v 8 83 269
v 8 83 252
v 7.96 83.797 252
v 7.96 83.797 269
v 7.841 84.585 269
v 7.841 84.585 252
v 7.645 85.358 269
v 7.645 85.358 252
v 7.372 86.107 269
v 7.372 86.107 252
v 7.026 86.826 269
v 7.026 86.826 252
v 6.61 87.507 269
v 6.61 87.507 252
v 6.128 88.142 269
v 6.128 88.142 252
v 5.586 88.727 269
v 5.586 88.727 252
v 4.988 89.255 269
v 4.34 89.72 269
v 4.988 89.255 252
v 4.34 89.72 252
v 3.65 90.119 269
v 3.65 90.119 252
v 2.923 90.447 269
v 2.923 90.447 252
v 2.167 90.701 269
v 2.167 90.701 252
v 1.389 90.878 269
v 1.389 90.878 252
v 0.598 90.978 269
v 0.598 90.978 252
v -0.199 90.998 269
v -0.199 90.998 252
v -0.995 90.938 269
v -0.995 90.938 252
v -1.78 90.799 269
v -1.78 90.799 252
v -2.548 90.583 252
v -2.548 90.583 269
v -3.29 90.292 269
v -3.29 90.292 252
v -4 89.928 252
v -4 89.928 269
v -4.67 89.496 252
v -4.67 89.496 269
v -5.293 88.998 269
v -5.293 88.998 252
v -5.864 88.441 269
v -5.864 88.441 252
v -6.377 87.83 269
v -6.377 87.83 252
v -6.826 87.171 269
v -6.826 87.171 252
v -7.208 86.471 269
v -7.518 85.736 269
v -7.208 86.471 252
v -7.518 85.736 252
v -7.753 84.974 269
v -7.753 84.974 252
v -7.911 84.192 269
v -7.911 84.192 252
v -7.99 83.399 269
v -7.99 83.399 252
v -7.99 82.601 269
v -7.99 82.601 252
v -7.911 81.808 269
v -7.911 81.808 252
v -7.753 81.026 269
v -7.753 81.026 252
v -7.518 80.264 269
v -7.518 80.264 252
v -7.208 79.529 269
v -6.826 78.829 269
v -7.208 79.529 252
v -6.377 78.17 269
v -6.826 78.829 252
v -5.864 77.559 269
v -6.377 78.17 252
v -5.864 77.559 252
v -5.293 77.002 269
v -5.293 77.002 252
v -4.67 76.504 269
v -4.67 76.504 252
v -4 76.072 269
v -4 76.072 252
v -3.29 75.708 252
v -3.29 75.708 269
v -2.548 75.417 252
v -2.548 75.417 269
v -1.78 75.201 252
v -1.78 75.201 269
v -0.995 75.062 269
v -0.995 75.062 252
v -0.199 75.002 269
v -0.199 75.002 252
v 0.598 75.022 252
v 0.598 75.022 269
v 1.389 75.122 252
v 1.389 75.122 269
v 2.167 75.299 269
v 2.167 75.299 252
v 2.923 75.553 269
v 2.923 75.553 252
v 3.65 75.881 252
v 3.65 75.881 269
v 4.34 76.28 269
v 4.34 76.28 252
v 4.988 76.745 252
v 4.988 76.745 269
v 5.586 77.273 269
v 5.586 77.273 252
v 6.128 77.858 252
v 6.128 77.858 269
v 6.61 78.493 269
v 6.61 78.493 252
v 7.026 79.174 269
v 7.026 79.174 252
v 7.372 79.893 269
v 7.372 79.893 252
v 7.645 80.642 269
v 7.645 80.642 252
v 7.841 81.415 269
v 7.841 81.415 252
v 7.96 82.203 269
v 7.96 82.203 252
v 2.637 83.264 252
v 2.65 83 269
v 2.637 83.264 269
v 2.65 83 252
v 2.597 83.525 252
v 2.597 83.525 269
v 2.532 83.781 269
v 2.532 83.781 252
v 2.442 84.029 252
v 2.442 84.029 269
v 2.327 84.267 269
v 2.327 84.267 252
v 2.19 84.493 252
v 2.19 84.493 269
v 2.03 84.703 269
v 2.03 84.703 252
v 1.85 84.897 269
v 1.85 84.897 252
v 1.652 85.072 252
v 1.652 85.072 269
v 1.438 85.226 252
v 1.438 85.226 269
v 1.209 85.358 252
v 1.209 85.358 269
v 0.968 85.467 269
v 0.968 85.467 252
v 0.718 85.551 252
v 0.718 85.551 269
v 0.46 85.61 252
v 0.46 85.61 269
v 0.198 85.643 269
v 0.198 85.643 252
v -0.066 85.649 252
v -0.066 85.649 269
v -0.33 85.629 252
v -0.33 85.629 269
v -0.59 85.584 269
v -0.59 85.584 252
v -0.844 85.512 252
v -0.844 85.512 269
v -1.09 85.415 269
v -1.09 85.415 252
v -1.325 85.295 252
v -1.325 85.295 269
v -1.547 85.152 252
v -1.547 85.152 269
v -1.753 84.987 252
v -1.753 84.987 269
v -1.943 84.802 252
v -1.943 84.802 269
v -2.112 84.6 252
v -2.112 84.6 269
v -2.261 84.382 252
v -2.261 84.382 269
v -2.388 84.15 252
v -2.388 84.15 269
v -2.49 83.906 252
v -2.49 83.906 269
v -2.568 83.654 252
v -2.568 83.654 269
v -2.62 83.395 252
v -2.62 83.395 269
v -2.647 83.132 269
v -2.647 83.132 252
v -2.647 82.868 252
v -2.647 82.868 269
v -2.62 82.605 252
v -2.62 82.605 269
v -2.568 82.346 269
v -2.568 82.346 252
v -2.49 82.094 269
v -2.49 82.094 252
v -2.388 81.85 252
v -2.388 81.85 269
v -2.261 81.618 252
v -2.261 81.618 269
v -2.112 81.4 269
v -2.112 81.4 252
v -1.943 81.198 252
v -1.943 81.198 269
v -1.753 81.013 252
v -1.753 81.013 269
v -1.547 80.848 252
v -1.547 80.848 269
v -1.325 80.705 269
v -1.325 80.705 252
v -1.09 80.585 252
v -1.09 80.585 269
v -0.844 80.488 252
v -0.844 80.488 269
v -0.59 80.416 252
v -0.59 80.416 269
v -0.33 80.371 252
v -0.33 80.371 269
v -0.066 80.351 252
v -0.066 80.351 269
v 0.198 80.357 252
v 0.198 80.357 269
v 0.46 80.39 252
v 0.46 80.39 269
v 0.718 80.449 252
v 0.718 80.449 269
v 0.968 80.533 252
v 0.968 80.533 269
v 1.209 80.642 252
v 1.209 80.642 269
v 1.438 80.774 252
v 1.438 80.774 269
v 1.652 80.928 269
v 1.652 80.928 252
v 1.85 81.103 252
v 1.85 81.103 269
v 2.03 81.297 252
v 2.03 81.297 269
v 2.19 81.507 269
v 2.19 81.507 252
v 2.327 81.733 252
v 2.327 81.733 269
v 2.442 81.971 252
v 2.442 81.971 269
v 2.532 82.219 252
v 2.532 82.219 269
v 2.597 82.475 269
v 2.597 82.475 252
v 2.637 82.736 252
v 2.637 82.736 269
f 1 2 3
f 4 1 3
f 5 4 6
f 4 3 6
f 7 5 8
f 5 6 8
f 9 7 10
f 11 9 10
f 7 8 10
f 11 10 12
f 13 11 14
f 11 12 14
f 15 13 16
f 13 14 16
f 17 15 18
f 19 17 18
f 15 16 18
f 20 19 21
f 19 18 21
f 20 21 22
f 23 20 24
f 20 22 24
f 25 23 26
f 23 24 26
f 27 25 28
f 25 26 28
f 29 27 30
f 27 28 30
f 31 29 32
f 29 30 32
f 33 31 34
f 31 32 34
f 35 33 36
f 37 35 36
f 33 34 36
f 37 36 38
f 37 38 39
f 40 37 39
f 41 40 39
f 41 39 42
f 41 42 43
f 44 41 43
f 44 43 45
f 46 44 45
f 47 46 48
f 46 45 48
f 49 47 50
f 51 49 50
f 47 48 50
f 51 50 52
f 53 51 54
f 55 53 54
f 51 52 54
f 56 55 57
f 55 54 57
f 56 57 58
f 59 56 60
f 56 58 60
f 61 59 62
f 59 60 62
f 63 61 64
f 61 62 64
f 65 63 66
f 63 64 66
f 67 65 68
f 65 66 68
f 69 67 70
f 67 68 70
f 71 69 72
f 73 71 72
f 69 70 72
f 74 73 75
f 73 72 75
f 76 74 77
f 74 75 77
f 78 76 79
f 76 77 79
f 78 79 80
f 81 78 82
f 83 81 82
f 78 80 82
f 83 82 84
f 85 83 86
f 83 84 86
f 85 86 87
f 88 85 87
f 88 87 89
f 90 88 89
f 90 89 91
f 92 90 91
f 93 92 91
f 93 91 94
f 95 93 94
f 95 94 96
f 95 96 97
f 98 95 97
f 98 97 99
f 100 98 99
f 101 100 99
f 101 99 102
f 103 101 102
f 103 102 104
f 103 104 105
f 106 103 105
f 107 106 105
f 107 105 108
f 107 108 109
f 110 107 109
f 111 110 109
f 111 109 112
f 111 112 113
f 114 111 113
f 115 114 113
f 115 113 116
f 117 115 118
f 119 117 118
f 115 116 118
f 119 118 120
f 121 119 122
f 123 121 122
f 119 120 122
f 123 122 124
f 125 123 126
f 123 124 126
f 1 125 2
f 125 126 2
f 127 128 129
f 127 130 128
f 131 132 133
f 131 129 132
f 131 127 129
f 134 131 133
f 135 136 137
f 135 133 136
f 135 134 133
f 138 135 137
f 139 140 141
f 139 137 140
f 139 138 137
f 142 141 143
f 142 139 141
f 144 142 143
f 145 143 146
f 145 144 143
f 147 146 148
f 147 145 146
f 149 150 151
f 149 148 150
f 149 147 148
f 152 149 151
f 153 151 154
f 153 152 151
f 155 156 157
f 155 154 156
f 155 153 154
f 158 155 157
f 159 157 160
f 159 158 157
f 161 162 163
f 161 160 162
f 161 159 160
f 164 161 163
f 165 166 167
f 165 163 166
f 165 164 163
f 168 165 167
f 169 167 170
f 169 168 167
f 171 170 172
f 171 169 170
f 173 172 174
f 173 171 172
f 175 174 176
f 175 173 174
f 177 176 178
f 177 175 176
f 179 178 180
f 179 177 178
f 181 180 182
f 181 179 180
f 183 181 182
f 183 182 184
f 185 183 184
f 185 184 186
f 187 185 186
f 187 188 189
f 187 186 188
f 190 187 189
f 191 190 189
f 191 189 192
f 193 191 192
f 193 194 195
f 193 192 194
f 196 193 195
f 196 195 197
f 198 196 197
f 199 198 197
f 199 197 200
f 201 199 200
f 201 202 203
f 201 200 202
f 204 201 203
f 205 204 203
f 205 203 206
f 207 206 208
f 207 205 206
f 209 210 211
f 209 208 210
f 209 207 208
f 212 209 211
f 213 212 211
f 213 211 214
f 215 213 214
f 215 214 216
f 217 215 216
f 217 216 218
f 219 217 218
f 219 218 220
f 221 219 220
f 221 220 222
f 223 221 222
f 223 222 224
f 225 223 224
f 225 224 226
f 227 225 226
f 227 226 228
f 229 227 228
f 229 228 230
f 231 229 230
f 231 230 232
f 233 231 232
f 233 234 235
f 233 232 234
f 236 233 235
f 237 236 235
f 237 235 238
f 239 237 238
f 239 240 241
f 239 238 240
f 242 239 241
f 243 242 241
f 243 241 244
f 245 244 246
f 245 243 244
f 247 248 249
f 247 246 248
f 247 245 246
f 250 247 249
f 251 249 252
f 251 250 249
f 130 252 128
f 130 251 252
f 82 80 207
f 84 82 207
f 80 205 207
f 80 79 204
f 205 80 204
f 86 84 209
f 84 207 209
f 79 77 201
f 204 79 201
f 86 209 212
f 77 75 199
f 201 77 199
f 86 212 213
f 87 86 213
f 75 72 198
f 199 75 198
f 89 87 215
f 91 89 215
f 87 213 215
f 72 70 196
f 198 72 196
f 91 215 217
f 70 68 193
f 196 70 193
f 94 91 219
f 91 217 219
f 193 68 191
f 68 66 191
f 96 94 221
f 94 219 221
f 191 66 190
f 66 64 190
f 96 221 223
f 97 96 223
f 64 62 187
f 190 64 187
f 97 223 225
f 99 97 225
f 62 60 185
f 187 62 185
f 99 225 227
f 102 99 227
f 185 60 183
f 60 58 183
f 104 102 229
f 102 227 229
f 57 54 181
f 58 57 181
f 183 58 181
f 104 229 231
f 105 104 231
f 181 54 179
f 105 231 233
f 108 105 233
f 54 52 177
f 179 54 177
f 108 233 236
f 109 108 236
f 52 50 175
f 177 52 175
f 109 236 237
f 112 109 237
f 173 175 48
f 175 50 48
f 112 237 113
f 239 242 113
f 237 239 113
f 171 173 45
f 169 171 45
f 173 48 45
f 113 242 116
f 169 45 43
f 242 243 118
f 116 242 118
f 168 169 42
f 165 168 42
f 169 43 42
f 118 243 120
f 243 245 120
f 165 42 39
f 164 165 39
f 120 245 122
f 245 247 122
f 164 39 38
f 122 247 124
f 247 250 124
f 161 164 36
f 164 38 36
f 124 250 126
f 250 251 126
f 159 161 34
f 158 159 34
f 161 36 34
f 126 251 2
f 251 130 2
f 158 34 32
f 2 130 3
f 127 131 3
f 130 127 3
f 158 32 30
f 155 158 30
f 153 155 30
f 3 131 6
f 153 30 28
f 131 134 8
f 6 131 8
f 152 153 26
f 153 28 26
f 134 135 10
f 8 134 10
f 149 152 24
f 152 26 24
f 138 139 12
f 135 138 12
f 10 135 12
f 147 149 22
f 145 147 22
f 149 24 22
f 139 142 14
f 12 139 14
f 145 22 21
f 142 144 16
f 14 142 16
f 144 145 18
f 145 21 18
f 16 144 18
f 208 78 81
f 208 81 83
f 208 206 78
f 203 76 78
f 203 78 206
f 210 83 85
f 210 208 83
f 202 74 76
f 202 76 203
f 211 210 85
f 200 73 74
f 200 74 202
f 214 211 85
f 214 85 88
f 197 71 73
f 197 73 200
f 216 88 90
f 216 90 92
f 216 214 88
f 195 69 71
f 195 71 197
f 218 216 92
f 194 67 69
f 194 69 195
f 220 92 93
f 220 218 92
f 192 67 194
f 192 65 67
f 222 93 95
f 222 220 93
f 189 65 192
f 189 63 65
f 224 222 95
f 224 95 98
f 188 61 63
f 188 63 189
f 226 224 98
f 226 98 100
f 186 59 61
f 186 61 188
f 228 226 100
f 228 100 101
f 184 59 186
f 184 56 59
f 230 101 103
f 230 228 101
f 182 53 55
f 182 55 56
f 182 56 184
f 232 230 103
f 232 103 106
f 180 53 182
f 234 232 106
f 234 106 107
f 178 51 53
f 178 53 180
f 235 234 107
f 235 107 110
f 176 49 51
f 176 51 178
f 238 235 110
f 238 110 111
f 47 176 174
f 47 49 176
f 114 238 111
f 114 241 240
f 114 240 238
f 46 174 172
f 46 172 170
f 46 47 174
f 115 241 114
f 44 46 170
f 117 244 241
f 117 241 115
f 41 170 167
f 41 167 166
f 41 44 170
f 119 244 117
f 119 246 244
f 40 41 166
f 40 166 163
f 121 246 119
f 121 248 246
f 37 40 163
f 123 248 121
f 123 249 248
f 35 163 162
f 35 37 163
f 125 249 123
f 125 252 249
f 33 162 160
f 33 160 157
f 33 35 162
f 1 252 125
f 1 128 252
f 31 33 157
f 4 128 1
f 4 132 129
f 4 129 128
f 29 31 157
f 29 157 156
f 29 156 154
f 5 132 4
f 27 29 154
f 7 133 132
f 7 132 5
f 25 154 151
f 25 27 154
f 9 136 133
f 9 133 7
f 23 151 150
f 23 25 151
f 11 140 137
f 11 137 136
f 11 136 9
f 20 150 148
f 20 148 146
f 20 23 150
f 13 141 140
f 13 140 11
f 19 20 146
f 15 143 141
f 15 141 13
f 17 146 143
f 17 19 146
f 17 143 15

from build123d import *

# Parameters (mm, degrees)
CYLINDER670_R     = 2.65
CYLINDER670_DEPTH = 40
CYLINDER669_R     = 8
CYLINDER669_DEPTH = 17


with BuildPart() as v_lec670:
    # Cylinder670 → Cylinder670 (new body)
    with BuildSketch(Plane(origin=(0, 83, 232), x_dir=(1, 0, 0), z_dir=(0, 0, 1))):
        Circle(CYLINDER670_R)
    extrude(amount=CYLINDER670_DEPTH)


with BuildPart() as cut268:
    # Cylinder669 → Cylinder669 (new body)
    with BuildSketch(Plane(origin=(0, 83, 252), x_dir=(1, 0, 0), z_dir=(0, 0, 1))):
        Circle(CYLINDER669_R)
    extrude(amount=CYLINDER669_DEPTH)

    # Cut268: cut Válec670
    add(v_lec670.part, mode=Mode.SUBTRACT)


solid = cut268.part
